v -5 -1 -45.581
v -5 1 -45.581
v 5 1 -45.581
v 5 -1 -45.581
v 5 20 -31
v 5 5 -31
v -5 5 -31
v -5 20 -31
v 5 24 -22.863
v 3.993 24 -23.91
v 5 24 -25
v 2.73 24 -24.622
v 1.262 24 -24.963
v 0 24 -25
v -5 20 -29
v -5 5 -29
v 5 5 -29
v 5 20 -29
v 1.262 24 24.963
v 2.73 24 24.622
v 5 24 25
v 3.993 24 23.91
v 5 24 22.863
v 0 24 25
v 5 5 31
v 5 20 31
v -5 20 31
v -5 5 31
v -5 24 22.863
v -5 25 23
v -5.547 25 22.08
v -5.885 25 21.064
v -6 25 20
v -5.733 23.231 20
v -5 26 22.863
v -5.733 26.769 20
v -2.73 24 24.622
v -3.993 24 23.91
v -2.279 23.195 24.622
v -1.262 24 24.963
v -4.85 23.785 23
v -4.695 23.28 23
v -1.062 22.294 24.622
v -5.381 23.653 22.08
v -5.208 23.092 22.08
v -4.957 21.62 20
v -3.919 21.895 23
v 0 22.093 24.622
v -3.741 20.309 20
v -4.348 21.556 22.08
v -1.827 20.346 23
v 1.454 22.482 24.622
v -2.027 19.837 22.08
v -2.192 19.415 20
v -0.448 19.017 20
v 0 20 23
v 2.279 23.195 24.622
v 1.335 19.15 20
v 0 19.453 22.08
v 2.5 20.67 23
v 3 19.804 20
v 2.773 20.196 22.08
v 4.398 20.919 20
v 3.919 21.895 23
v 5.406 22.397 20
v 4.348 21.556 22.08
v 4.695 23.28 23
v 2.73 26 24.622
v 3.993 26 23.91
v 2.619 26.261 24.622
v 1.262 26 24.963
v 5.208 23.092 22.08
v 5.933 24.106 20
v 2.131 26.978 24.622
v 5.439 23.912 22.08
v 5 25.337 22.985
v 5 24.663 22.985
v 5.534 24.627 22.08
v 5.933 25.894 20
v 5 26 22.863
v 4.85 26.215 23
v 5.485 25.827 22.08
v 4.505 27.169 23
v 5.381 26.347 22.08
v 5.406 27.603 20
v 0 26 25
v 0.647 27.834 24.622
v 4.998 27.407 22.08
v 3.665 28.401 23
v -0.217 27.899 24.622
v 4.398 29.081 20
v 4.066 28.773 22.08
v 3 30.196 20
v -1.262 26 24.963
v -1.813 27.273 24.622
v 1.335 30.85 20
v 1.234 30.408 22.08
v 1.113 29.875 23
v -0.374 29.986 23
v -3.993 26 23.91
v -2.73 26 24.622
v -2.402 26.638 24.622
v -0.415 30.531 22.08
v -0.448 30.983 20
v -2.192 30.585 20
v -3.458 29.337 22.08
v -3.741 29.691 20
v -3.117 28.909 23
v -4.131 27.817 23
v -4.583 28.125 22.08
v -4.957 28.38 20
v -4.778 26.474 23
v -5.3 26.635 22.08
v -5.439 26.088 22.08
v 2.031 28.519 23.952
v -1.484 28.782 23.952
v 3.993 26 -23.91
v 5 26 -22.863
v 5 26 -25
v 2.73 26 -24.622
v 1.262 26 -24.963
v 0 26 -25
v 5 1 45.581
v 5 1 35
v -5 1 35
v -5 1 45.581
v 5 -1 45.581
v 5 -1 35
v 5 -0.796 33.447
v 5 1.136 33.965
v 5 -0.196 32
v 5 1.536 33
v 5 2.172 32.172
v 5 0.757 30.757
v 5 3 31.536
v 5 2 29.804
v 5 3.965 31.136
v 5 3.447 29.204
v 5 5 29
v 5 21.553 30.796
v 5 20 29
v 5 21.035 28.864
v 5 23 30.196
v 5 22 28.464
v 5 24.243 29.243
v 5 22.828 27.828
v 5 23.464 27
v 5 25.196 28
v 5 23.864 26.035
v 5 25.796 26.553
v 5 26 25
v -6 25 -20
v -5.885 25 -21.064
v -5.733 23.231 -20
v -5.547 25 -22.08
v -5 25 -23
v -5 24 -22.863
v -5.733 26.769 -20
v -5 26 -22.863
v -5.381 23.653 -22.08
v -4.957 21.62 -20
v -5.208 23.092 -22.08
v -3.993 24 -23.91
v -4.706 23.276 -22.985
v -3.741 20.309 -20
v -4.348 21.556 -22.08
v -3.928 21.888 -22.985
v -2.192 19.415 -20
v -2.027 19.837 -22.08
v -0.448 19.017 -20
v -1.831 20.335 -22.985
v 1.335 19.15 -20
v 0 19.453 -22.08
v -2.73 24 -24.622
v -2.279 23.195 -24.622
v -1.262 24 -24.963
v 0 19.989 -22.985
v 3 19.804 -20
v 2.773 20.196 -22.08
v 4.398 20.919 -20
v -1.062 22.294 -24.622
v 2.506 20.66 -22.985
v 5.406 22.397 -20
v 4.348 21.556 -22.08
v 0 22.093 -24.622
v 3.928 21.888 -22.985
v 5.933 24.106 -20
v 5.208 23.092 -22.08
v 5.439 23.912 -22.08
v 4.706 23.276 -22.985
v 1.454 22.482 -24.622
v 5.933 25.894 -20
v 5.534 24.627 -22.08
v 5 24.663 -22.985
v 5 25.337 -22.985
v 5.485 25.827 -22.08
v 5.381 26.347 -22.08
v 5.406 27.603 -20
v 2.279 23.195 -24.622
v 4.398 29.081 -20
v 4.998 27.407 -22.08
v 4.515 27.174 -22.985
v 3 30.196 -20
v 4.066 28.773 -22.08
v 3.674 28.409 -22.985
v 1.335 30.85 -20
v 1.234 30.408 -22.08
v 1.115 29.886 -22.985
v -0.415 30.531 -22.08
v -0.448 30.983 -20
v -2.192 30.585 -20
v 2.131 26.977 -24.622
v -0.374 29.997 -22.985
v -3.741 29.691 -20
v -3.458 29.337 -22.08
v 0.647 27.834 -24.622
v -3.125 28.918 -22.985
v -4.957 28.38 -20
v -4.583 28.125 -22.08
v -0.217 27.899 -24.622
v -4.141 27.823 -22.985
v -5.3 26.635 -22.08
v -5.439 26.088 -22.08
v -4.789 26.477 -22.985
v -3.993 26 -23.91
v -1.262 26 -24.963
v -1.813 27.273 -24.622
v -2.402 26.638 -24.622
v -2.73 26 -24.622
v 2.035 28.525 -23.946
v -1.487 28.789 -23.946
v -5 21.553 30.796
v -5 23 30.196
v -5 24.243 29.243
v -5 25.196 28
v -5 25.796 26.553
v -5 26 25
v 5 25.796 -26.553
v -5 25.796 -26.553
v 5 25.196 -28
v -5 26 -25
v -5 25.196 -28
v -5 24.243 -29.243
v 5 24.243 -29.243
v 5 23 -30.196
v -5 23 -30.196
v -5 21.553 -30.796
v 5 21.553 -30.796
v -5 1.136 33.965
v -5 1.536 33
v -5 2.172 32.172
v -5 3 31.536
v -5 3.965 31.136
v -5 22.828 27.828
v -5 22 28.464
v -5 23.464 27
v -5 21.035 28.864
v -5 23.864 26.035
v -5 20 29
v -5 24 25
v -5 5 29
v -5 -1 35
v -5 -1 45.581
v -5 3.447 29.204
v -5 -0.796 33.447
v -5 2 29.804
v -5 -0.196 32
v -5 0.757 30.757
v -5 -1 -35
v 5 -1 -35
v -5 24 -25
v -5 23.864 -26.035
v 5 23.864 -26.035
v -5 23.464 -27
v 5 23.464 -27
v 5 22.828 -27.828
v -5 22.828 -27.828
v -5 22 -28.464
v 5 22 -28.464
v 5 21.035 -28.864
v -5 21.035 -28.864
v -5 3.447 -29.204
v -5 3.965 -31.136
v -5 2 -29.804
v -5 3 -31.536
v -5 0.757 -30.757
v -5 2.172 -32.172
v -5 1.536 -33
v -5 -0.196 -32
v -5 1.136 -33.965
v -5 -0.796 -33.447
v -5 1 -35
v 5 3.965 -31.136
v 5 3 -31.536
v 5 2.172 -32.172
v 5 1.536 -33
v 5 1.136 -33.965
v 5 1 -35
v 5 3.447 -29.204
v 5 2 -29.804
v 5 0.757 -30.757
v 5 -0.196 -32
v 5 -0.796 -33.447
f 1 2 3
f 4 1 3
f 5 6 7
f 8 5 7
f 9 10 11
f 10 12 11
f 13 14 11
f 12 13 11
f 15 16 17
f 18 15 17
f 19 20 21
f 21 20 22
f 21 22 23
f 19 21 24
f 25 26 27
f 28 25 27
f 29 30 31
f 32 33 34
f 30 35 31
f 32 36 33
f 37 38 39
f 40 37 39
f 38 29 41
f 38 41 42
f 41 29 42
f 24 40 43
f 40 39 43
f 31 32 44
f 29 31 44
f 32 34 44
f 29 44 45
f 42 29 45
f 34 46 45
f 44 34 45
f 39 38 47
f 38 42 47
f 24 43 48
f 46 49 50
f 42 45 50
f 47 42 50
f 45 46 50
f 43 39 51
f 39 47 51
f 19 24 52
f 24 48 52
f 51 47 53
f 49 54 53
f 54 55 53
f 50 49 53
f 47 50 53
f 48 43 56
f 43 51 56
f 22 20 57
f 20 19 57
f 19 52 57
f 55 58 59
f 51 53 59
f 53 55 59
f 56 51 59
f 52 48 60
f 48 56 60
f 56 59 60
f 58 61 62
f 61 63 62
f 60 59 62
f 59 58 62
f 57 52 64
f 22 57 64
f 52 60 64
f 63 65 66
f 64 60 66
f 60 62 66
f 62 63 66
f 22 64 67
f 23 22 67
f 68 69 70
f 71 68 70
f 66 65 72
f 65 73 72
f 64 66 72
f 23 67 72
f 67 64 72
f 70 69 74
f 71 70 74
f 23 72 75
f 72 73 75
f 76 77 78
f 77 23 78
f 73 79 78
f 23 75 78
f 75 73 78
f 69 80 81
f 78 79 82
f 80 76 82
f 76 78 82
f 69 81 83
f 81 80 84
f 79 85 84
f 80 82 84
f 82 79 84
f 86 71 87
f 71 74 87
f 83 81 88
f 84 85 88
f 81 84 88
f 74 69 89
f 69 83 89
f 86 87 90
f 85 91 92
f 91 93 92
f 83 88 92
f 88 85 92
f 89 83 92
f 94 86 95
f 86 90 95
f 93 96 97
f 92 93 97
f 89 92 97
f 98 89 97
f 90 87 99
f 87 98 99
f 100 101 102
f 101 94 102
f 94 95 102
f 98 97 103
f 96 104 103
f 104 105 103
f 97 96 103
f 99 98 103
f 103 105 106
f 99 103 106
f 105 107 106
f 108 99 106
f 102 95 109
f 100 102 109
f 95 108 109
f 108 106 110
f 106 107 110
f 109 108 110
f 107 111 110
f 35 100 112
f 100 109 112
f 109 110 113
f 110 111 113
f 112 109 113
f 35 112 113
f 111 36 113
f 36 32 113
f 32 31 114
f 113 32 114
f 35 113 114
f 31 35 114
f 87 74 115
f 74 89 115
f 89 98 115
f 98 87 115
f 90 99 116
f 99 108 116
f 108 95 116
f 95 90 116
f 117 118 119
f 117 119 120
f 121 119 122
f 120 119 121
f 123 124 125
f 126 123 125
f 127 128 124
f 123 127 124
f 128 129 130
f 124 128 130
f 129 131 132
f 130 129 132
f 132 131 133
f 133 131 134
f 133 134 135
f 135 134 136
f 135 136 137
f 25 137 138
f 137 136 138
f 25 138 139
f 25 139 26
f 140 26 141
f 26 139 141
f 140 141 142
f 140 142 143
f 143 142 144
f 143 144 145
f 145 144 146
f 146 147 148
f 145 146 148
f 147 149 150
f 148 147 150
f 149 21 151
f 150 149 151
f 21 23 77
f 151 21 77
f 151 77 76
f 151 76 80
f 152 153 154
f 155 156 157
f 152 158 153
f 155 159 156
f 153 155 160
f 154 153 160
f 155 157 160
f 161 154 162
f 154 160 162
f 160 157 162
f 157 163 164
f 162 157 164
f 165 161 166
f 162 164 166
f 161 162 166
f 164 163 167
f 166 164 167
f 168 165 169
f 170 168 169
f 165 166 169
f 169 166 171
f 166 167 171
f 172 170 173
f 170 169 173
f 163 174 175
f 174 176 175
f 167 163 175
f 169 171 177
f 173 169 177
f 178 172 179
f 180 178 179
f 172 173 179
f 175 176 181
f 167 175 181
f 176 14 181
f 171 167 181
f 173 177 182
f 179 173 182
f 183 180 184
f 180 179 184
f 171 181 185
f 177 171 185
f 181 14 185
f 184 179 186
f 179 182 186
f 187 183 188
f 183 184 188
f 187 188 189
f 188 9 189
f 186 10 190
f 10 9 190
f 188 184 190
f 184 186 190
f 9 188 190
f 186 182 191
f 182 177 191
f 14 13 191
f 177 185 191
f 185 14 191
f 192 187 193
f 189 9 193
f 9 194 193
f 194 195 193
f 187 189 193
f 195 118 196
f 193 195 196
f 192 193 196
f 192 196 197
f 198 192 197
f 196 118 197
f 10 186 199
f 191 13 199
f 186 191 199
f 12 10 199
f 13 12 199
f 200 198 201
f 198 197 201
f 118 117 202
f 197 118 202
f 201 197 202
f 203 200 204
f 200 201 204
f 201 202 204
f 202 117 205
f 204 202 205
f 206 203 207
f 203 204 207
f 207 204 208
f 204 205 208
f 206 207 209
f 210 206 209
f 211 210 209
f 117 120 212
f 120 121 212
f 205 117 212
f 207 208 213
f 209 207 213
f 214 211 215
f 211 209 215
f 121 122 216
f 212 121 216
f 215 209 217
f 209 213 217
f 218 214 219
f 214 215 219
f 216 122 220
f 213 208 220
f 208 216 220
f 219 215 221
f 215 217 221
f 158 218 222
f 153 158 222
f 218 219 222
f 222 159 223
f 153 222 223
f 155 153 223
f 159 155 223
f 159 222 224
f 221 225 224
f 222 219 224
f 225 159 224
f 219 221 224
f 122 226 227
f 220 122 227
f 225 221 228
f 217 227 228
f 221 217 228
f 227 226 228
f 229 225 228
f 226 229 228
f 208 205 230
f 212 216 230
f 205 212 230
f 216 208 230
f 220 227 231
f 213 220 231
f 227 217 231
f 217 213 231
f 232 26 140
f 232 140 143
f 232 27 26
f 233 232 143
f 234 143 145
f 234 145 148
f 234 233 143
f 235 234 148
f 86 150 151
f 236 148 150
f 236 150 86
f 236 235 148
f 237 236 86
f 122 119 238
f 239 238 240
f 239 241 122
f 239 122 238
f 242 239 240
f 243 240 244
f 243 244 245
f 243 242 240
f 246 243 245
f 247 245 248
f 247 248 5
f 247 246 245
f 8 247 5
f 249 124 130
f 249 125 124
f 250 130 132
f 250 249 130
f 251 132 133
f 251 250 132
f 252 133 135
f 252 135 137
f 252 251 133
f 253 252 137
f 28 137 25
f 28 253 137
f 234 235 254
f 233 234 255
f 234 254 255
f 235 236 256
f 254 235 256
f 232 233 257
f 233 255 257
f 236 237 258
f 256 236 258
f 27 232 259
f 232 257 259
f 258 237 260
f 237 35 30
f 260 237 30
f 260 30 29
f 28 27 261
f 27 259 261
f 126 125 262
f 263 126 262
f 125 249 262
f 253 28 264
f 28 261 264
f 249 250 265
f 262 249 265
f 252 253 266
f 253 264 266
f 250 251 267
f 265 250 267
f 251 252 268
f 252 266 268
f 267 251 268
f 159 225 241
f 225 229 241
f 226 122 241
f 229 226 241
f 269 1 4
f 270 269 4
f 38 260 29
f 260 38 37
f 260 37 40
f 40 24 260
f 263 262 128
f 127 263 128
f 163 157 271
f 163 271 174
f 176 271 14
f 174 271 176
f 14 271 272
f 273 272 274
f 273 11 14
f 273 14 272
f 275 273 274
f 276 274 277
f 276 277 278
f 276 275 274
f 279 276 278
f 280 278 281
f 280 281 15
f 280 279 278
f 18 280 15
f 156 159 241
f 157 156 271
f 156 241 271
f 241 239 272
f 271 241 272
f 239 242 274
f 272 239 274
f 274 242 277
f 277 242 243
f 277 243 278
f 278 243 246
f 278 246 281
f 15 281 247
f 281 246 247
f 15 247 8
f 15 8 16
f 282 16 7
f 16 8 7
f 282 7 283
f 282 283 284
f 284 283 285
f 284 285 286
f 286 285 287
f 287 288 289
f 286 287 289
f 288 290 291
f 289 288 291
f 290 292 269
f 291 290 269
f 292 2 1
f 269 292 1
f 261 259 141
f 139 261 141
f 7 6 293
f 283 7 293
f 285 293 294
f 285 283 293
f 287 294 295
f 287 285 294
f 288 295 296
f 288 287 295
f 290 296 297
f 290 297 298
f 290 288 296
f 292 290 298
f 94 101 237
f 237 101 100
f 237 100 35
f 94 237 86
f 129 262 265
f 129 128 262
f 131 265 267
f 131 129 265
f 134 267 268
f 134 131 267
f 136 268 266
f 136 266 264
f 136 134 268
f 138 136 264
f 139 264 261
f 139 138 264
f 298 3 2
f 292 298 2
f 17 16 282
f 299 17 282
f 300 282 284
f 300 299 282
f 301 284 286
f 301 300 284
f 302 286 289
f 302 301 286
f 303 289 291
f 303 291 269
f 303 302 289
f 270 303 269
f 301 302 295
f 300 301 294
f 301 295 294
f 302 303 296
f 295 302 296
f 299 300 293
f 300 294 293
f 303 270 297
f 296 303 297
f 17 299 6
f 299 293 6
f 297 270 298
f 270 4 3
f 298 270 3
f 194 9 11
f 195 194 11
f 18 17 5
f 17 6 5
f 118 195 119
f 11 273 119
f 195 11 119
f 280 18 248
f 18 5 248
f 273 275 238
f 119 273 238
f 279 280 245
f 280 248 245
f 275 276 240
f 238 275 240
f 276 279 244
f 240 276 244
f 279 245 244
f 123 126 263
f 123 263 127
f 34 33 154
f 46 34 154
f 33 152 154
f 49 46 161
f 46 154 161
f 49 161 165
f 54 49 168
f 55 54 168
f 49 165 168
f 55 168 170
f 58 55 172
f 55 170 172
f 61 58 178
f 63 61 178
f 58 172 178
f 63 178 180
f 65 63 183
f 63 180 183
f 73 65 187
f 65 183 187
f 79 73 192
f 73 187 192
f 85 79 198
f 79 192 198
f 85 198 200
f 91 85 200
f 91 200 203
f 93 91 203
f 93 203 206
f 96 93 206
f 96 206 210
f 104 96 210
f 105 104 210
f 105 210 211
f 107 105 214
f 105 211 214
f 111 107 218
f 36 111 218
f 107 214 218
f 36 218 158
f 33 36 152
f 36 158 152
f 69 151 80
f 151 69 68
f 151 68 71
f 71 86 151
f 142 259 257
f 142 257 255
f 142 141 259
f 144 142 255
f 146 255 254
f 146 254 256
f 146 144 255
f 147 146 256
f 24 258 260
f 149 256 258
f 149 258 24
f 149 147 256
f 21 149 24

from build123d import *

# Parameters (mm, degrees)
SKETCH2_W = 10
SKETCH2_H = 2


with BuildPart() as part:
    # Sweep1: sweep along a path in Sketch1
    with BuildLine(Plane(origin=(0, 0, 0), x_dir=(0, 0, -1), z_dir=(1, 0, 0))) as sweep1_path:
        Line((-45.581395349, 0), (-35, 0))
        ThreePointArc((-35, 0), (-31.464466094, 1.464466094), (-30, 5))
        Line((-30, 5), (-30, 20))
        ThreePointArc((-30, 20), (-28.535533906, 23.535533906), (-25, 25))
        Line((-25, 25), (25, 25))
        ThreePointArc((25, 25), (28.535533906, 23.535533906), (30, 20))
        Line((30, 20), (30, 5))
        ThreePointArc((30, 5), (31.464466094, 1.464466094), (35, 0))
        Line((35, 0), (45.581395349, 0))
    # Sketch2 → Sweep1 (sweep)
    with BuildSketch(Plane.XY.offset(45.581395349)):
        Rectangle(SKETCH2_W, SKETCH2_H)
    sweep(path=sweep1_path.line)

    # Sketch3 → Revolve1 (revolve)
    with BuildSketch(Plane(origin=(0, 0, 0), x_dir=(0, 0, -1), z_dir=(1, 0, 0)), mode=Mode.PRIVATE) as revolve1_sk:
        with BuildLine():
            Line((-25, 25), (-25, 26))
            ThreePointArc((-25, 26), (-23.535533906, 29.535533906), (-20, 31))
            Line((-20, 31), (20, 31))
            ThreePointArc((20, 31), (23.535533906, 29.535533906), (25, 26))
            Line((25, 26), (25, 25))
            Line((25, 25), (-25, 25))
        make_face()
    revolve(revolve1_sk.sketch.rotate(Axis((0, 25, -25), (0, 0, 1)), 90), axis=Axis((0, 25, -25), (0, 0, 1)))


solid = part.part
